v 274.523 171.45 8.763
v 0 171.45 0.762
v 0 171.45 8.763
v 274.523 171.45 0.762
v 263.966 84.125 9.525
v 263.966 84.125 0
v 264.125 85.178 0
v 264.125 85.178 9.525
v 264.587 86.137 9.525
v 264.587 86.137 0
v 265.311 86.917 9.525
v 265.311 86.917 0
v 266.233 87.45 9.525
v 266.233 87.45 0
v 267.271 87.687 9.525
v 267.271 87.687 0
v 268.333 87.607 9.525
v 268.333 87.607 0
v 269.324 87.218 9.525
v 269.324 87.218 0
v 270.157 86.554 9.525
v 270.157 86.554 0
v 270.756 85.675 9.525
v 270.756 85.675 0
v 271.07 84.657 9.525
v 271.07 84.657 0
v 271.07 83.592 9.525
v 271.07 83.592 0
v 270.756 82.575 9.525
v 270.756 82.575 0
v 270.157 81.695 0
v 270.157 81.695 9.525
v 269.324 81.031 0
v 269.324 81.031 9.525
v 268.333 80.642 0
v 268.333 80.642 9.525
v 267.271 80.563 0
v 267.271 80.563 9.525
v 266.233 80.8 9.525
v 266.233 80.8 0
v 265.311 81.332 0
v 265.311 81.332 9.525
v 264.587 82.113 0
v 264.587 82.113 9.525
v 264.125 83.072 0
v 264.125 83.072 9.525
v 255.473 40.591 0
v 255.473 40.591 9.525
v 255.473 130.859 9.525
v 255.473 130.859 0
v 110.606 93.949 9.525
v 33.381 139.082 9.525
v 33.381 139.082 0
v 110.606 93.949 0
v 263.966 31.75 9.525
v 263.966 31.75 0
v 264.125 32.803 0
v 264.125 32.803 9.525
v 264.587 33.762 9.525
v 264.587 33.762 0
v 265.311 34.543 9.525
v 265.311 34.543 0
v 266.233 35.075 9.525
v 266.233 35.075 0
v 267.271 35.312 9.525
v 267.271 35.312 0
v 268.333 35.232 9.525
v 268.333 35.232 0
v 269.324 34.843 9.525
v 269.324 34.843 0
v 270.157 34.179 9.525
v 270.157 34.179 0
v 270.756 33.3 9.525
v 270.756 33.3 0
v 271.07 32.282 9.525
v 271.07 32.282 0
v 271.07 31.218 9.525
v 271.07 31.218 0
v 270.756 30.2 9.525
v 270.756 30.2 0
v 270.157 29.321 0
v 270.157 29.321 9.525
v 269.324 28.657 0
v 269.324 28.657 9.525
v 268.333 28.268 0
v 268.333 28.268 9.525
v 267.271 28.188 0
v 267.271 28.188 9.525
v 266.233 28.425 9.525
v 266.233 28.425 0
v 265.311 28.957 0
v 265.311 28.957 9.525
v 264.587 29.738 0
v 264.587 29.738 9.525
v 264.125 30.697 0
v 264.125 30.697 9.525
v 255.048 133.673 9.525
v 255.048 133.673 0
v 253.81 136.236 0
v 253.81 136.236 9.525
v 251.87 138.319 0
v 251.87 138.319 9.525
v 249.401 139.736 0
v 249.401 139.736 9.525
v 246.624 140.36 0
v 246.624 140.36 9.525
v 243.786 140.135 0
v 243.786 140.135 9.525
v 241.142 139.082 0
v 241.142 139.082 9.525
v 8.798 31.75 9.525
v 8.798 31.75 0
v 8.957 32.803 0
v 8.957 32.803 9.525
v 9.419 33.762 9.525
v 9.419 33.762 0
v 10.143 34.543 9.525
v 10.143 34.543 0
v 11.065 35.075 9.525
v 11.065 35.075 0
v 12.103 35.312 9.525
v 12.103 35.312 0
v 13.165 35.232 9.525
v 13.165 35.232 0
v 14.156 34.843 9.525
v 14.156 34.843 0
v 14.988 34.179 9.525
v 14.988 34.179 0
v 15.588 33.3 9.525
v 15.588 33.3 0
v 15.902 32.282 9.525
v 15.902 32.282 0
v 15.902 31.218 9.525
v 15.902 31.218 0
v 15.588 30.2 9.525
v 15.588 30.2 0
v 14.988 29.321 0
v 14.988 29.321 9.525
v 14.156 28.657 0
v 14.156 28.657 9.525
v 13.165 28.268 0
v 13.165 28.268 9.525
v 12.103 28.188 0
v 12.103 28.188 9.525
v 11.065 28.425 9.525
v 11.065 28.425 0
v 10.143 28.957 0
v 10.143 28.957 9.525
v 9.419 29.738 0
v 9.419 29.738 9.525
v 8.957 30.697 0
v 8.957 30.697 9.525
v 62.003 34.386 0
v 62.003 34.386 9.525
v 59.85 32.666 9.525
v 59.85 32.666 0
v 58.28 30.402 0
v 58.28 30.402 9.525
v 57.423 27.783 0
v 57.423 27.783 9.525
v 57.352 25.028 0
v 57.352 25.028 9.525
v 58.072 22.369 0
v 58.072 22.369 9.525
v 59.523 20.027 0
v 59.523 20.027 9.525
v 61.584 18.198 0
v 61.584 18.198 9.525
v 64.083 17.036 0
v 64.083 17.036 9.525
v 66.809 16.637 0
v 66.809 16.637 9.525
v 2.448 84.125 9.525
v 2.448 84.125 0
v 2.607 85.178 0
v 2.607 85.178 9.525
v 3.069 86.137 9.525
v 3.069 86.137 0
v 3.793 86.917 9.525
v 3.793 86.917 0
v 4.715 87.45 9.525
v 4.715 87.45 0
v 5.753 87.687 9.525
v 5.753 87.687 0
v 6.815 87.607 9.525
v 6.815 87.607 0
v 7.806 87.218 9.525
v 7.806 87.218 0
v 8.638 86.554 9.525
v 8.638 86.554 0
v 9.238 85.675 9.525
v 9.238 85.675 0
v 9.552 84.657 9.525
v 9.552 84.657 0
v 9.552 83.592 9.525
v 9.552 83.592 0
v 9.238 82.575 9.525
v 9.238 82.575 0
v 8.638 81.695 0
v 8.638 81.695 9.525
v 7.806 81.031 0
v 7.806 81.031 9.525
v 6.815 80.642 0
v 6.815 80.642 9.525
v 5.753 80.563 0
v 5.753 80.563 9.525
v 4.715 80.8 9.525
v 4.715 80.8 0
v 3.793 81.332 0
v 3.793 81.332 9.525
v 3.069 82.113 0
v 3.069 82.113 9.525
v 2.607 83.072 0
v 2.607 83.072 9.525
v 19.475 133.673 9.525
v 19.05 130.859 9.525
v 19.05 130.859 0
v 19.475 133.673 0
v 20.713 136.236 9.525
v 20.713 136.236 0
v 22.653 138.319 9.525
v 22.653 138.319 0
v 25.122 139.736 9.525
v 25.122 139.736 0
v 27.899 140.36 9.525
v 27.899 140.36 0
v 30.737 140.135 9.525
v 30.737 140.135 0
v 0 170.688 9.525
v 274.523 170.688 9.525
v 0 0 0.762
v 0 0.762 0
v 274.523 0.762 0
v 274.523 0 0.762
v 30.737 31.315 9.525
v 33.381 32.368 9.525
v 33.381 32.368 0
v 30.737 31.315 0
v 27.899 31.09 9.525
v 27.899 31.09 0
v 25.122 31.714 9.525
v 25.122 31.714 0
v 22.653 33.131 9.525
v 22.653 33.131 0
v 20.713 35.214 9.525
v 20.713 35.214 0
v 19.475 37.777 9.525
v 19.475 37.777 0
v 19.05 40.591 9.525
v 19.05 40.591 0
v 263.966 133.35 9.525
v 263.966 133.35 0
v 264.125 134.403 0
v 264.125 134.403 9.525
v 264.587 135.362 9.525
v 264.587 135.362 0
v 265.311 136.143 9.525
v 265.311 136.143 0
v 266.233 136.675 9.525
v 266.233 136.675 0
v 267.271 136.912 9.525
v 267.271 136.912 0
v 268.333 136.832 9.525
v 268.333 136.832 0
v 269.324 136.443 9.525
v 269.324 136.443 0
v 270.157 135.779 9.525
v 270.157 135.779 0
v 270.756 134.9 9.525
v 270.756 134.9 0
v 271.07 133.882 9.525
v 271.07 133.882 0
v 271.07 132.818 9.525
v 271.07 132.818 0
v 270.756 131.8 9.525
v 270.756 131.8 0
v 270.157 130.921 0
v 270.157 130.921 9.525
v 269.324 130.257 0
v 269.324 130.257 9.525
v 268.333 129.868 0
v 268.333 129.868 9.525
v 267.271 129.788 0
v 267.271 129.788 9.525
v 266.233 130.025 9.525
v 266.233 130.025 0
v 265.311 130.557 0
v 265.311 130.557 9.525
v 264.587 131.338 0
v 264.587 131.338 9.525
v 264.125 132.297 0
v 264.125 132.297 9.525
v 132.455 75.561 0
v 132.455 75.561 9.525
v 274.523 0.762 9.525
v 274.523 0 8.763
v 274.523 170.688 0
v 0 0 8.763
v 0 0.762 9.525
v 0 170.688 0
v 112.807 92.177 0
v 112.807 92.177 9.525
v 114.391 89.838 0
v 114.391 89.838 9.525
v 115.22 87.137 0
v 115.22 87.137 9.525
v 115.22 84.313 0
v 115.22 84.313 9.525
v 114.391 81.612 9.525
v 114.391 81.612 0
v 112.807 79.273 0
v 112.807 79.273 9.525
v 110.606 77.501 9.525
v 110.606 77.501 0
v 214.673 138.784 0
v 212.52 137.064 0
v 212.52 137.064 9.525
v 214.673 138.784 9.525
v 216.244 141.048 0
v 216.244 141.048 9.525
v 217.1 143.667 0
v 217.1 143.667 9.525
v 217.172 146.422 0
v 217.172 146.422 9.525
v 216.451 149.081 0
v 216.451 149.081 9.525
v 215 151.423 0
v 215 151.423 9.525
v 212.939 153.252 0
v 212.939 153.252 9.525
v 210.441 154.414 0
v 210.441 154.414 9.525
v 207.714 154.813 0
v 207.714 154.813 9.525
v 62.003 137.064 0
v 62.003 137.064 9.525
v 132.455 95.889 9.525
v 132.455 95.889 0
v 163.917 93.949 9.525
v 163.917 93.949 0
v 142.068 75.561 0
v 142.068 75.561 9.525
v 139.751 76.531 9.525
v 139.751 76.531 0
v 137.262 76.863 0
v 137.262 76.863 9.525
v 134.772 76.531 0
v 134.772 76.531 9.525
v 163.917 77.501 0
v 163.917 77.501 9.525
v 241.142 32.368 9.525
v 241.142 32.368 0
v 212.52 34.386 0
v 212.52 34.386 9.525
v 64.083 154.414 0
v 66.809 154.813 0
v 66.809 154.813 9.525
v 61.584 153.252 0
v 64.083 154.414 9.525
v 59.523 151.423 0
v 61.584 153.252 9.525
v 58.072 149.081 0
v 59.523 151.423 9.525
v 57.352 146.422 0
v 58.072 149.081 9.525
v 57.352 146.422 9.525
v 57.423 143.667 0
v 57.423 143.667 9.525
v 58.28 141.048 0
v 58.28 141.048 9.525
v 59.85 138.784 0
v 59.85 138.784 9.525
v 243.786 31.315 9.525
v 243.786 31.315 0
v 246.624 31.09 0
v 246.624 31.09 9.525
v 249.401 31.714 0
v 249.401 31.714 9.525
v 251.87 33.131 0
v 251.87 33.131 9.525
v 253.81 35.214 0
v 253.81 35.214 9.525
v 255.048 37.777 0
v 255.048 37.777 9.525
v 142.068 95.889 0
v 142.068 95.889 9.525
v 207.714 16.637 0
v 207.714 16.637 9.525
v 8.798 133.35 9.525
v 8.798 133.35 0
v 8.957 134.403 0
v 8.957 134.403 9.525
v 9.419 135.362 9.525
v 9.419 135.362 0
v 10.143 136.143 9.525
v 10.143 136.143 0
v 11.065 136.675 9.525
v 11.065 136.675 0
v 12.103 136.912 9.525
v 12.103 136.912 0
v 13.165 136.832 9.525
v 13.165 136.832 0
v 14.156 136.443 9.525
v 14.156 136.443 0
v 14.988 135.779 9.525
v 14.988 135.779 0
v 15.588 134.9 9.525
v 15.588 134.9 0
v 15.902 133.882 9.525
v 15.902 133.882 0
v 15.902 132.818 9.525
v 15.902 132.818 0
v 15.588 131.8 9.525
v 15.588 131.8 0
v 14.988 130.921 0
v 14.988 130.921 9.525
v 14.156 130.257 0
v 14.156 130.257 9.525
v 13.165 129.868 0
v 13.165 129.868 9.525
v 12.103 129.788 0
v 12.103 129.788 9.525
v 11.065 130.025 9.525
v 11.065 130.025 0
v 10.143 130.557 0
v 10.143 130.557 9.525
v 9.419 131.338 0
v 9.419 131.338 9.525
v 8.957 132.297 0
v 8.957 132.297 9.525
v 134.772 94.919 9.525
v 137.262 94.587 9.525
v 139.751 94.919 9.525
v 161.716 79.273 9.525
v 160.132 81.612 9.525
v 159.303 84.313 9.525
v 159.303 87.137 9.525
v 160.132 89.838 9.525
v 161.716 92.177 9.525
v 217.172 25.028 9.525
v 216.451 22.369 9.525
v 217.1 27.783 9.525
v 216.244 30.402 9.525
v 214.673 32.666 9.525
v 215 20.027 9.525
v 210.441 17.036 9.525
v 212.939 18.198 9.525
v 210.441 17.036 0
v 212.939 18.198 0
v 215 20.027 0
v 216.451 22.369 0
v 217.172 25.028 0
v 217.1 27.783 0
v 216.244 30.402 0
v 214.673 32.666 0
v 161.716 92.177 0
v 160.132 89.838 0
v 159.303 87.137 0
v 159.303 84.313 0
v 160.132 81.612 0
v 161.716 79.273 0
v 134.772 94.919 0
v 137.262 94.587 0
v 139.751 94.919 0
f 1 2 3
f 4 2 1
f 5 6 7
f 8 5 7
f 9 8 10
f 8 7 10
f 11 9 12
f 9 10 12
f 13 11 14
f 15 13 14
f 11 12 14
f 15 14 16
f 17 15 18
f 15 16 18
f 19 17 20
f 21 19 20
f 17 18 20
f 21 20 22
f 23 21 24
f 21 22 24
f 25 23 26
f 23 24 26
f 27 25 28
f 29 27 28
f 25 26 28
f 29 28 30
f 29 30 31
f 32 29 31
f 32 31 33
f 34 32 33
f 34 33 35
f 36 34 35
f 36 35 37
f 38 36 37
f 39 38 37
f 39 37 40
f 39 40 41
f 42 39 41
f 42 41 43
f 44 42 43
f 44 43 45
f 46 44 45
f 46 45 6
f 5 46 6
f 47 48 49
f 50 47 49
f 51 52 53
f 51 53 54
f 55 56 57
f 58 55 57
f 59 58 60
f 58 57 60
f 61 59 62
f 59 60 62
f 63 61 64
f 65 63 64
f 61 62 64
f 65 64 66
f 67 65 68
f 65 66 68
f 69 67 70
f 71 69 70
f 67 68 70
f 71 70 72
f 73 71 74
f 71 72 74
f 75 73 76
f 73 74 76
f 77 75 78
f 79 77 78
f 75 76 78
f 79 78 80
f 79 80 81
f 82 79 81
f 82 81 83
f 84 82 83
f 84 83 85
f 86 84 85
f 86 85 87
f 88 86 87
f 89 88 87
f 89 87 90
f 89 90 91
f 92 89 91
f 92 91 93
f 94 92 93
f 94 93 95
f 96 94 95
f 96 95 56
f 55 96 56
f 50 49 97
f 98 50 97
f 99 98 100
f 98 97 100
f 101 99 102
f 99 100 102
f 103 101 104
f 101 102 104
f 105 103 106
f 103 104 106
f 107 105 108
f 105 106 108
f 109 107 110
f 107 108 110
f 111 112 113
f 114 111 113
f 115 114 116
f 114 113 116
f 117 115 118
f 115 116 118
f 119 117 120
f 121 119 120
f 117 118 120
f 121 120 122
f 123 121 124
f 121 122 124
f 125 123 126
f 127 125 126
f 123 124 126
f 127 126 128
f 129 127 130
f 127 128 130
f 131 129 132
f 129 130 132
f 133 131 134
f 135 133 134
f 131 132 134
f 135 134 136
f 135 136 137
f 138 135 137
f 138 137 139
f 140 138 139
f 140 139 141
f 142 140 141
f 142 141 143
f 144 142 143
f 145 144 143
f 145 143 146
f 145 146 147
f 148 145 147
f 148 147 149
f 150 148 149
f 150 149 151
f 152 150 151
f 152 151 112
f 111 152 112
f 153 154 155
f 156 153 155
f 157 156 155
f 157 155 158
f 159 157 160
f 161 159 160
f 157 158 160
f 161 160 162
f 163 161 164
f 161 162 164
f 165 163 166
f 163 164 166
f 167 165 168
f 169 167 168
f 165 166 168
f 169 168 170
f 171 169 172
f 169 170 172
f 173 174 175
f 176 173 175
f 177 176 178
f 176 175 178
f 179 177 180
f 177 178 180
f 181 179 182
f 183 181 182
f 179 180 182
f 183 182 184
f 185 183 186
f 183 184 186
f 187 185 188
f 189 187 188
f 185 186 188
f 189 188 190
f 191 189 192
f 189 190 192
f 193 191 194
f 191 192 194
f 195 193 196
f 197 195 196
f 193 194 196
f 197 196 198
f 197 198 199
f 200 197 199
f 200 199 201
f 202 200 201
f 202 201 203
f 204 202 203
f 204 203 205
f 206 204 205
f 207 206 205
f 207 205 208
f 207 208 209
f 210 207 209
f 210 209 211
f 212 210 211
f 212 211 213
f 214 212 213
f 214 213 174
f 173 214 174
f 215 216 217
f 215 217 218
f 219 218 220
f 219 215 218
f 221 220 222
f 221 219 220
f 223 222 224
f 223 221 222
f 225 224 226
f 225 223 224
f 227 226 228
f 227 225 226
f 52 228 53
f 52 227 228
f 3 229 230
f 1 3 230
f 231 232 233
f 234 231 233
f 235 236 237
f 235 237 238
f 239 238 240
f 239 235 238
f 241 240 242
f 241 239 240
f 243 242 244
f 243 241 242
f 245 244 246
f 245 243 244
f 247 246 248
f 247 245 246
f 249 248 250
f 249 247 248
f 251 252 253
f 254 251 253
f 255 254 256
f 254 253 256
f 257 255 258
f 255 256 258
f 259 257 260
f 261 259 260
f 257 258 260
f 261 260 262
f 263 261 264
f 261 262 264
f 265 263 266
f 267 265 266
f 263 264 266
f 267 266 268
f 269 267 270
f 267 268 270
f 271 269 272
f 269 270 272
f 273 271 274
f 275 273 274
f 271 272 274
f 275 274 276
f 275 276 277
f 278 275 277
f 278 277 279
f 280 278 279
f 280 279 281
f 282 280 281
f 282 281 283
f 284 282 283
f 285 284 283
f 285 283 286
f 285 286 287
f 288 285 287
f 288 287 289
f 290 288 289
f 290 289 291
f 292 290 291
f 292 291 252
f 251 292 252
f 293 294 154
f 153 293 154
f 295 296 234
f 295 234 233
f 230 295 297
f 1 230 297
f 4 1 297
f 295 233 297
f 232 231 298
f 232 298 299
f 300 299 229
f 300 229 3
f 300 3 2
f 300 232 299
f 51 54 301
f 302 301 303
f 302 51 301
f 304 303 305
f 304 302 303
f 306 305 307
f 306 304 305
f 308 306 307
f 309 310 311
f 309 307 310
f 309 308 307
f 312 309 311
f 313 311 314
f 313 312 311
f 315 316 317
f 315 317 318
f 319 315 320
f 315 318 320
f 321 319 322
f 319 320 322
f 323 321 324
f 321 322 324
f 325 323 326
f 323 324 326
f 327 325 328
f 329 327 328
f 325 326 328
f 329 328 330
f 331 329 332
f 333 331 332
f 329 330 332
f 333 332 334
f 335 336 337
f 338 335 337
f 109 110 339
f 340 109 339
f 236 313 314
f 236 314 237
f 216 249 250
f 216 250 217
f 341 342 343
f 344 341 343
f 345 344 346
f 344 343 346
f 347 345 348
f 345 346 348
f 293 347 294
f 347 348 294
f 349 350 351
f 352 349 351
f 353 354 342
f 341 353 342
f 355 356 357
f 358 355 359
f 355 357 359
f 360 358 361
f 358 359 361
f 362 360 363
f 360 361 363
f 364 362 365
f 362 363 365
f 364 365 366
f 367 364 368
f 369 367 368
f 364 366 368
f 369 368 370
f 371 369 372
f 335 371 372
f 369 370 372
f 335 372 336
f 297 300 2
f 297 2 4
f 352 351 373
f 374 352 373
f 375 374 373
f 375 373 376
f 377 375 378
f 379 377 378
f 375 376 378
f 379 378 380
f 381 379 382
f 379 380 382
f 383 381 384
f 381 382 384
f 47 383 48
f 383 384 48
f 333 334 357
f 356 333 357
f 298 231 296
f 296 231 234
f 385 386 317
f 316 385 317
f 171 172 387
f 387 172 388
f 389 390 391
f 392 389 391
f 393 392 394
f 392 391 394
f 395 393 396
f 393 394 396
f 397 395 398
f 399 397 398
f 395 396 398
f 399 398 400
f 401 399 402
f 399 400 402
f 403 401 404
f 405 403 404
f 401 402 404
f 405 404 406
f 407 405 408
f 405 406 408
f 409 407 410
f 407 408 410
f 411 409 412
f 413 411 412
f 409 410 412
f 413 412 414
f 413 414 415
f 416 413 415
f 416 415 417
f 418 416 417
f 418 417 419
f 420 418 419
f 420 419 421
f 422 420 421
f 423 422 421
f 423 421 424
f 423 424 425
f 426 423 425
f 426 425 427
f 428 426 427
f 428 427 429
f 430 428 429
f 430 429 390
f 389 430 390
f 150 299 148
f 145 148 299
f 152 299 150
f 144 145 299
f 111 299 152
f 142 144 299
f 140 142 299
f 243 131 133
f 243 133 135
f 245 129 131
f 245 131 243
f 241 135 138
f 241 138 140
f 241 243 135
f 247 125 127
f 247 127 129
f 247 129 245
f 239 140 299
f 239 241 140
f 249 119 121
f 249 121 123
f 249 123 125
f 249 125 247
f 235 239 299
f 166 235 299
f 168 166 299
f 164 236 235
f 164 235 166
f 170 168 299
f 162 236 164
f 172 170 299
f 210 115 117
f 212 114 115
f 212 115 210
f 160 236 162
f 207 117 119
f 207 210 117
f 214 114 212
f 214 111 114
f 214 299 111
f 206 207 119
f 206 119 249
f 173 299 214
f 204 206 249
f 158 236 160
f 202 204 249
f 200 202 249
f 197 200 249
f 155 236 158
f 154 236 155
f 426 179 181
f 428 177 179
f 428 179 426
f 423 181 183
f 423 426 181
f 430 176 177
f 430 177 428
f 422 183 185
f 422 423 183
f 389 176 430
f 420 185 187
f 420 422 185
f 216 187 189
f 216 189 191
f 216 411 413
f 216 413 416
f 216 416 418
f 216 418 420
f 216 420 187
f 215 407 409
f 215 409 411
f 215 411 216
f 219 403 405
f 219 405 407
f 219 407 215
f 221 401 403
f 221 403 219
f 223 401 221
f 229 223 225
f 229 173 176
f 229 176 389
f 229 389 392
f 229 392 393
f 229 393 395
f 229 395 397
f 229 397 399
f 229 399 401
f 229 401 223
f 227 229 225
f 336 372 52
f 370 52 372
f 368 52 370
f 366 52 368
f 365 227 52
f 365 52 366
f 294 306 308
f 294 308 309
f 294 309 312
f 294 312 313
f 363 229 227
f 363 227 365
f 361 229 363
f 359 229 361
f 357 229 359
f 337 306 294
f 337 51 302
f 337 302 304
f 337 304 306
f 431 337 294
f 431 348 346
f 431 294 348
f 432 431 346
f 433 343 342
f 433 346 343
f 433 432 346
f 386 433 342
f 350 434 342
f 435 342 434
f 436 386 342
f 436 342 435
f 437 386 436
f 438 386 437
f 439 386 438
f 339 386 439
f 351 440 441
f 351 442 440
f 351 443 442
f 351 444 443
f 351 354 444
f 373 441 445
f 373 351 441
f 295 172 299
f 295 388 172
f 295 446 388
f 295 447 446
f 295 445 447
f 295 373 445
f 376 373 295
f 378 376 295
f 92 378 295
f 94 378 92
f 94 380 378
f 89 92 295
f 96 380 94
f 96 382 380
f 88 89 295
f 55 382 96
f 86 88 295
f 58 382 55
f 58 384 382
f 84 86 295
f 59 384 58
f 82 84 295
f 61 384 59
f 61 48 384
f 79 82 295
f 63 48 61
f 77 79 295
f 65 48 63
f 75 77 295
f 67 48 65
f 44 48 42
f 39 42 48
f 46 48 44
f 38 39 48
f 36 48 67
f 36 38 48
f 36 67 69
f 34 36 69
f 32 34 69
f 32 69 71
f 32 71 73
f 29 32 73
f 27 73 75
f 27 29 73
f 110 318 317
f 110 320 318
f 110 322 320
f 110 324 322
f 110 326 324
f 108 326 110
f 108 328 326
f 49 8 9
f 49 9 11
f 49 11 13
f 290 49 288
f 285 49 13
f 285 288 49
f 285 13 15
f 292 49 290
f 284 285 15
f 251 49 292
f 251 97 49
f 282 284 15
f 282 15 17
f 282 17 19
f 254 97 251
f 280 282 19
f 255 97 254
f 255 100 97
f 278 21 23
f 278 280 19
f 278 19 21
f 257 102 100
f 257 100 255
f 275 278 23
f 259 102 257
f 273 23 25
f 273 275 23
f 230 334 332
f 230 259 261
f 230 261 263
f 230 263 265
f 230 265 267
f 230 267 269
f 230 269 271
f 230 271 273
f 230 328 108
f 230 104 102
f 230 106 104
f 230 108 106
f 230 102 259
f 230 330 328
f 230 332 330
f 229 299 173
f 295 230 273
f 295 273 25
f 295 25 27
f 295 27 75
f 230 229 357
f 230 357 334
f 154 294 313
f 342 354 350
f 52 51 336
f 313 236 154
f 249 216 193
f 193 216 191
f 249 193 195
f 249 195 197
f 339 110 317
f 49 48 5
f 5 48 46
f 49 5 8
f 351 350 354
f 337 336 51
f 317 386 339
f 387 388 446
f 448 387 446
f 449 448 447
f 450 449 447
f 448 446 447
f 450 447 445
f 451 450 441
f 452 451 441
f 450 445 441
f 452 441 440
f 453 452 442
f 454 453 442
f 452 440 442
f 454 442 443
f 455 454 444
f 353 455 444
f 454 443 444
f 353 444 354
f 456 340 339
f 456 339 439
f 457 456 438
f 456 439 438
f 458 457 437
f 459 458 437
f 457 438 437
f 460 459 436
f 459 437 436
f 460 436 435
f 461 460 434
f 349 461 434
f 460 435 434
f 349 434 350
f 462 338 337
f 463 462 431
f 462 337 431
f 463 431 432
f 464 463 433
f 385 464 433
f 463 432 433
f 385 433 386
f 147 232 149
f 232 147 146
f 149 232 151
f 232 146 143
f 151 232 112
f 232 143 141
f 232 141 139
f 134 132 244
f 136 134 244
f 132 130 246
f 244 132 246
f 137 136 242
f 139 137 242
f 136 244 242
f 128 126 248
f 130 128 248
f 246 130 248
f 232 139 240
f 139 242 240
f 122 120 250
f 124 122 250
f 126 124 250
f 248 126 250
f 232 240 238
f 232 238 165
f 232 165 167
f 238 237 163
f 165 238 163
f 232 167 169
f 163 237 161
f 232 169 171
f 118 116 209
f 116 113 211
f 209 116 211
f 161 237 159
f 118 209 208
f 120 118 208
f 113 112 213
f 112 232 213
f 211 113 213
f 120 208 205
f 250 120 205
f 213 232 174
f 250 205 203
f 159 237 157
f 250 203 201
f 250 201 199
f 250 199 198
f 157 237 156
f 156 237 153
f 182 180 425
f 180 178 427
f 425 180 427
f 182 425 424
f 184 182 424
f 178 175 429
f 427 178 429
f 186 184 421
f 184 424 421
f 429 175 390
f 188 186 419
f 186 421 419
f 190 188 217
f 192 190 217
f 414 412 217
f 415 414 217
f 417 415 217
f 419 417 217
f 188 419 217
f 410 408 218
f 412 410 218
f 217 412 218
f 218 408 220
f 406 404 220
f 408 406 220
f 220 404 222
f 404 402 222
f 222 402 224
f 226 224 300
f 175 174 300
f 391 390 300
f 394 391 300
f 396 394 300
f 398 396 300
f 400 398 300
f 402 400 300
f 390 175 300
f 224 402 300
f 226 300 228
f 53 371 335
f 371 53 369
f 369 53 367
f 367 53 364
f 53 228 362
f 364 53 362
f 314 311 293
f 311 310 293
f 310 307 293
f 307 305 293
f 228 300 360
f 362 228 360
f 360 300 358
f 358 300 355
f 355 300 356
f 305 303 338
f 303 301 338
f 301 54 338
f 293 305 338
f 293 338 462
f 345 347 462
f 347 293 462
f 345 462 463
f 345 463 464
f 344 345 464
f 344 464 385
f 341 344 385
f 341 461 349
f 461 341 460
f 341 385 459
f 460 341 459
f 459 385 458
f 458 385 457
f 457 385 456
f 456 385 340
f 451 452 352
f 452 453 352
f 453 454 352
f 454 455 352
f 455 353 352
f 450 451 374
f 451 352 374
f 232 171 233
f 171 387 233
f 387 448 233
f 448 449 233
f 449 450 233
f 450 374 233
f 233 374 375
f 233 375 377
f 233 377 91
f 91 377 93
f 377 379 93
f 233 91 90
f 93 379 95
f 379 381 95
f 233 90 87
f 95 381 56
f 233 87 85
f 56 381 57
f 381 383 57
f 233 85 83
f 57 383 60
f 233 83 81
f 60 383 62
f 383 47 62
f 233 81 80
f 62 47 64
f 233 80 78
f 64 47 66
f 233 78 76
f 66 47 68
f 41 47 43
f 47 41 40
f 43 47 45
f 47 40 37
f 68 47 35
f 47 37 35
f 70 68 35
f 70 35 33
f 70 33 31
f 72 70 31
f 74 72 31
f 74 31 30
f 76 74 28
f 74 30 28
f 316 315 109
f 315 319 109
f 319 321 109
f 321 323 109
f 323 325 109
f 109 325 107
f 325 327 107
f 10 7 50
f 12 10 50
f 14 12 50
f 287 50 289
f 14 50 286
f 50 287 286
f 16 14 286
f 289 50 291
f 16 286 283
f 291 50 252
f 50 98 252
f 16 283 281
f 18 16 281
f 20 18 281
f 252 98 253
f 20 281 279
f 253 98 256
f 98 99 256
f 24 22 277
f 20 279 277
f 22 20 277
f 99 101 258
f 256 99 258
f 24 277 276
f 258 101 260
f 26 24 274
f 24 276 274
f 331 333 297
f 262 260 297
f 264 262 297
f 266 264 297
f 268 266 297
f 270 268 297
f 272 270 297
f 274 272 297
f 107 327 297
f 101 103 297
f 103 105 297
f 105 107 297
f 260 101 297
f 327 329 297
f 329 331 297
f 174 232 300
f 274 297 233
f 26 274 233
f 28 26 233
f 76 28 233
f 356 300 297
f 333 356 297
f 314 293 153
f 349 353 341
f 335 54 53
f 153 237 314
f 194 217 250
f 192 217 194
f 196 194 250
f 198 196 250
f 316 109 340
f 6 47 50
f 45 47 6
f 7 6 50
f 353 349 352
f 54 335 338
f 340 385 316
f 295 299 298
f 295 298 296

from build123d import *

# Parameters (mm, degrees)
SKETCH1_W                       = 274.5232
SKETCH1_H                       = 171.45
BOSS_EXTRUDE1_DEPTH             = 9.525
F_9_32_0_28125_DIAMETER_HOLE1_D = 7.14375
CHAMFER1_SIZE                   = 0.762
CUT_EXTRUDE1_DEPTH              = 10.525


with BuildPart() as part:
    # Sketch1 → Boss-Extrude1 (new body)
    with BuildSketch(Plane.XY):
        with Locations((137.2616, 85.725)):
            Rectangle(SKETCH1_W, SKETCH1_H)
    extrude(amount=BOSS_EXTRUDE1_DEPTH)

    # 9/32 (0.28125) Diameter Hole1 (through all)
    with Locations(Plane.XY.offset(9.525)):
        with Locations((6.0198, 84.1248), (12.3698, 133.35), (12.3698, 31.75), (267.5382, 133.35), (267.5382, 84.1248), (267.5382, 31.75)):
            Hole(F_9_32_0_28125_DIAMETER_HOLE1_D / 2)

    # Chamfer1
    chamfer1_edges = [part.edges().sort_by_distance(p)[0] for p in [
        (137.2616, 171.45, 9.525),
        (137.2616, 171.45, 0),
        (137.2616, 0, 0),
        (137.2616, 0, 9.525),
    ]]
    chamfer(chamfer1_edges, length=CHAMFER1_SIZE)

    # Sketch6 → Cut-Extrude1 (cut, through all)
    with BuildSketch(Plane.XY.offset(9.525)):
        with BuildLine():
            Line((33.381181438, 139.082261479), (110.606344338, 93.948517799))
            ThreePointArc((110.606344338, 93.948517799), (115.325162901, 85.725), (110.606344338, 77.501482201))
            Line((110.606344338, 77.501482201), (33.381181438, 32.367738521))
            ThreePointArc((33.381181438, 32.367738521), (23.834391031, 32.329764227), (19.05, 40.591256319))
            Line((19.05, 40.591256319), (19.05, 130.858743681))
            ThreePointArc((19.05, 130.858743681), (23.834391031, 139.120235773), (33.381181438, 139.082261479))
        make_face()
        with BuildLine():
            Line((62.002810809, 137.064482201), (132.455418562, 95.888914284))
            ThreePointArc((132.455418562, 95.888914284), (137.2616, 94.587432082), (142.067781438, 95.888914284))
            Line((142.067781438, 95.888914284), (212.520389191, 137.064482201))
            ThreePointArc((212.520389191, 137.064482201), (216.908081584, 147.777640332), (207.714207753, 154.813))
            Line((207.714207753, 154.813), (66.808992247, 154.813))
            ThreePointArc((66.808992247, 154.813), (57.615118416, 147.777640332), (62.002810809, 137.064482201))
        make_face()
        with BuildLine():
            Line((241.142018562, 139.082261479), (163.916855662, 93.948517799))
            ThreePointArc((163.916855662, 93.948517799), (159.198037099, 85.725), (163.916855662, 77.501482201))
            Line((163.916855662, 77.501482201), (241.142018562, 32.367738521))
            ThreePointArc((241.142018562, 32.367738521), (250.688808969, 32.329764227), (255.4732, 40.591256319))
            Line((255.4732, 40.591256319), (255.4732, 130.858743681))
            ThreePointArc((255.4732, 130.858743681), (250.688808969, 139.120235773), (241.142018562, 139.082261479))
        make_face()
        with BuildLine():
            Line((66.808992247, 16.637), (207.714207753, 16.637))
            ThreePointArc((207.714207753, 16.637), (216.908081584, 23.672359668), (212.520389191, 34.385517799))
            Line((212.520389191, 34.385517799), (142.067781438, 75.561085716))
            ThreePointArc((142.067781438, 75.561085716), (137.2616, 76.862567918), (132.455418562, 75.561085716))
            Line((132.455418562, 75.561085716), (62.002810809, 34.385517799))
            ThreePointArc((62.002810809, 34.385517799), (57.615118416, 23.672359668), (66.808992247, 16.637))
        make_face()
    extrude(amount=-CUT_EXTRUDE1_DEPTH, mode=Mode.SUBTRACT)


solid = part.part
